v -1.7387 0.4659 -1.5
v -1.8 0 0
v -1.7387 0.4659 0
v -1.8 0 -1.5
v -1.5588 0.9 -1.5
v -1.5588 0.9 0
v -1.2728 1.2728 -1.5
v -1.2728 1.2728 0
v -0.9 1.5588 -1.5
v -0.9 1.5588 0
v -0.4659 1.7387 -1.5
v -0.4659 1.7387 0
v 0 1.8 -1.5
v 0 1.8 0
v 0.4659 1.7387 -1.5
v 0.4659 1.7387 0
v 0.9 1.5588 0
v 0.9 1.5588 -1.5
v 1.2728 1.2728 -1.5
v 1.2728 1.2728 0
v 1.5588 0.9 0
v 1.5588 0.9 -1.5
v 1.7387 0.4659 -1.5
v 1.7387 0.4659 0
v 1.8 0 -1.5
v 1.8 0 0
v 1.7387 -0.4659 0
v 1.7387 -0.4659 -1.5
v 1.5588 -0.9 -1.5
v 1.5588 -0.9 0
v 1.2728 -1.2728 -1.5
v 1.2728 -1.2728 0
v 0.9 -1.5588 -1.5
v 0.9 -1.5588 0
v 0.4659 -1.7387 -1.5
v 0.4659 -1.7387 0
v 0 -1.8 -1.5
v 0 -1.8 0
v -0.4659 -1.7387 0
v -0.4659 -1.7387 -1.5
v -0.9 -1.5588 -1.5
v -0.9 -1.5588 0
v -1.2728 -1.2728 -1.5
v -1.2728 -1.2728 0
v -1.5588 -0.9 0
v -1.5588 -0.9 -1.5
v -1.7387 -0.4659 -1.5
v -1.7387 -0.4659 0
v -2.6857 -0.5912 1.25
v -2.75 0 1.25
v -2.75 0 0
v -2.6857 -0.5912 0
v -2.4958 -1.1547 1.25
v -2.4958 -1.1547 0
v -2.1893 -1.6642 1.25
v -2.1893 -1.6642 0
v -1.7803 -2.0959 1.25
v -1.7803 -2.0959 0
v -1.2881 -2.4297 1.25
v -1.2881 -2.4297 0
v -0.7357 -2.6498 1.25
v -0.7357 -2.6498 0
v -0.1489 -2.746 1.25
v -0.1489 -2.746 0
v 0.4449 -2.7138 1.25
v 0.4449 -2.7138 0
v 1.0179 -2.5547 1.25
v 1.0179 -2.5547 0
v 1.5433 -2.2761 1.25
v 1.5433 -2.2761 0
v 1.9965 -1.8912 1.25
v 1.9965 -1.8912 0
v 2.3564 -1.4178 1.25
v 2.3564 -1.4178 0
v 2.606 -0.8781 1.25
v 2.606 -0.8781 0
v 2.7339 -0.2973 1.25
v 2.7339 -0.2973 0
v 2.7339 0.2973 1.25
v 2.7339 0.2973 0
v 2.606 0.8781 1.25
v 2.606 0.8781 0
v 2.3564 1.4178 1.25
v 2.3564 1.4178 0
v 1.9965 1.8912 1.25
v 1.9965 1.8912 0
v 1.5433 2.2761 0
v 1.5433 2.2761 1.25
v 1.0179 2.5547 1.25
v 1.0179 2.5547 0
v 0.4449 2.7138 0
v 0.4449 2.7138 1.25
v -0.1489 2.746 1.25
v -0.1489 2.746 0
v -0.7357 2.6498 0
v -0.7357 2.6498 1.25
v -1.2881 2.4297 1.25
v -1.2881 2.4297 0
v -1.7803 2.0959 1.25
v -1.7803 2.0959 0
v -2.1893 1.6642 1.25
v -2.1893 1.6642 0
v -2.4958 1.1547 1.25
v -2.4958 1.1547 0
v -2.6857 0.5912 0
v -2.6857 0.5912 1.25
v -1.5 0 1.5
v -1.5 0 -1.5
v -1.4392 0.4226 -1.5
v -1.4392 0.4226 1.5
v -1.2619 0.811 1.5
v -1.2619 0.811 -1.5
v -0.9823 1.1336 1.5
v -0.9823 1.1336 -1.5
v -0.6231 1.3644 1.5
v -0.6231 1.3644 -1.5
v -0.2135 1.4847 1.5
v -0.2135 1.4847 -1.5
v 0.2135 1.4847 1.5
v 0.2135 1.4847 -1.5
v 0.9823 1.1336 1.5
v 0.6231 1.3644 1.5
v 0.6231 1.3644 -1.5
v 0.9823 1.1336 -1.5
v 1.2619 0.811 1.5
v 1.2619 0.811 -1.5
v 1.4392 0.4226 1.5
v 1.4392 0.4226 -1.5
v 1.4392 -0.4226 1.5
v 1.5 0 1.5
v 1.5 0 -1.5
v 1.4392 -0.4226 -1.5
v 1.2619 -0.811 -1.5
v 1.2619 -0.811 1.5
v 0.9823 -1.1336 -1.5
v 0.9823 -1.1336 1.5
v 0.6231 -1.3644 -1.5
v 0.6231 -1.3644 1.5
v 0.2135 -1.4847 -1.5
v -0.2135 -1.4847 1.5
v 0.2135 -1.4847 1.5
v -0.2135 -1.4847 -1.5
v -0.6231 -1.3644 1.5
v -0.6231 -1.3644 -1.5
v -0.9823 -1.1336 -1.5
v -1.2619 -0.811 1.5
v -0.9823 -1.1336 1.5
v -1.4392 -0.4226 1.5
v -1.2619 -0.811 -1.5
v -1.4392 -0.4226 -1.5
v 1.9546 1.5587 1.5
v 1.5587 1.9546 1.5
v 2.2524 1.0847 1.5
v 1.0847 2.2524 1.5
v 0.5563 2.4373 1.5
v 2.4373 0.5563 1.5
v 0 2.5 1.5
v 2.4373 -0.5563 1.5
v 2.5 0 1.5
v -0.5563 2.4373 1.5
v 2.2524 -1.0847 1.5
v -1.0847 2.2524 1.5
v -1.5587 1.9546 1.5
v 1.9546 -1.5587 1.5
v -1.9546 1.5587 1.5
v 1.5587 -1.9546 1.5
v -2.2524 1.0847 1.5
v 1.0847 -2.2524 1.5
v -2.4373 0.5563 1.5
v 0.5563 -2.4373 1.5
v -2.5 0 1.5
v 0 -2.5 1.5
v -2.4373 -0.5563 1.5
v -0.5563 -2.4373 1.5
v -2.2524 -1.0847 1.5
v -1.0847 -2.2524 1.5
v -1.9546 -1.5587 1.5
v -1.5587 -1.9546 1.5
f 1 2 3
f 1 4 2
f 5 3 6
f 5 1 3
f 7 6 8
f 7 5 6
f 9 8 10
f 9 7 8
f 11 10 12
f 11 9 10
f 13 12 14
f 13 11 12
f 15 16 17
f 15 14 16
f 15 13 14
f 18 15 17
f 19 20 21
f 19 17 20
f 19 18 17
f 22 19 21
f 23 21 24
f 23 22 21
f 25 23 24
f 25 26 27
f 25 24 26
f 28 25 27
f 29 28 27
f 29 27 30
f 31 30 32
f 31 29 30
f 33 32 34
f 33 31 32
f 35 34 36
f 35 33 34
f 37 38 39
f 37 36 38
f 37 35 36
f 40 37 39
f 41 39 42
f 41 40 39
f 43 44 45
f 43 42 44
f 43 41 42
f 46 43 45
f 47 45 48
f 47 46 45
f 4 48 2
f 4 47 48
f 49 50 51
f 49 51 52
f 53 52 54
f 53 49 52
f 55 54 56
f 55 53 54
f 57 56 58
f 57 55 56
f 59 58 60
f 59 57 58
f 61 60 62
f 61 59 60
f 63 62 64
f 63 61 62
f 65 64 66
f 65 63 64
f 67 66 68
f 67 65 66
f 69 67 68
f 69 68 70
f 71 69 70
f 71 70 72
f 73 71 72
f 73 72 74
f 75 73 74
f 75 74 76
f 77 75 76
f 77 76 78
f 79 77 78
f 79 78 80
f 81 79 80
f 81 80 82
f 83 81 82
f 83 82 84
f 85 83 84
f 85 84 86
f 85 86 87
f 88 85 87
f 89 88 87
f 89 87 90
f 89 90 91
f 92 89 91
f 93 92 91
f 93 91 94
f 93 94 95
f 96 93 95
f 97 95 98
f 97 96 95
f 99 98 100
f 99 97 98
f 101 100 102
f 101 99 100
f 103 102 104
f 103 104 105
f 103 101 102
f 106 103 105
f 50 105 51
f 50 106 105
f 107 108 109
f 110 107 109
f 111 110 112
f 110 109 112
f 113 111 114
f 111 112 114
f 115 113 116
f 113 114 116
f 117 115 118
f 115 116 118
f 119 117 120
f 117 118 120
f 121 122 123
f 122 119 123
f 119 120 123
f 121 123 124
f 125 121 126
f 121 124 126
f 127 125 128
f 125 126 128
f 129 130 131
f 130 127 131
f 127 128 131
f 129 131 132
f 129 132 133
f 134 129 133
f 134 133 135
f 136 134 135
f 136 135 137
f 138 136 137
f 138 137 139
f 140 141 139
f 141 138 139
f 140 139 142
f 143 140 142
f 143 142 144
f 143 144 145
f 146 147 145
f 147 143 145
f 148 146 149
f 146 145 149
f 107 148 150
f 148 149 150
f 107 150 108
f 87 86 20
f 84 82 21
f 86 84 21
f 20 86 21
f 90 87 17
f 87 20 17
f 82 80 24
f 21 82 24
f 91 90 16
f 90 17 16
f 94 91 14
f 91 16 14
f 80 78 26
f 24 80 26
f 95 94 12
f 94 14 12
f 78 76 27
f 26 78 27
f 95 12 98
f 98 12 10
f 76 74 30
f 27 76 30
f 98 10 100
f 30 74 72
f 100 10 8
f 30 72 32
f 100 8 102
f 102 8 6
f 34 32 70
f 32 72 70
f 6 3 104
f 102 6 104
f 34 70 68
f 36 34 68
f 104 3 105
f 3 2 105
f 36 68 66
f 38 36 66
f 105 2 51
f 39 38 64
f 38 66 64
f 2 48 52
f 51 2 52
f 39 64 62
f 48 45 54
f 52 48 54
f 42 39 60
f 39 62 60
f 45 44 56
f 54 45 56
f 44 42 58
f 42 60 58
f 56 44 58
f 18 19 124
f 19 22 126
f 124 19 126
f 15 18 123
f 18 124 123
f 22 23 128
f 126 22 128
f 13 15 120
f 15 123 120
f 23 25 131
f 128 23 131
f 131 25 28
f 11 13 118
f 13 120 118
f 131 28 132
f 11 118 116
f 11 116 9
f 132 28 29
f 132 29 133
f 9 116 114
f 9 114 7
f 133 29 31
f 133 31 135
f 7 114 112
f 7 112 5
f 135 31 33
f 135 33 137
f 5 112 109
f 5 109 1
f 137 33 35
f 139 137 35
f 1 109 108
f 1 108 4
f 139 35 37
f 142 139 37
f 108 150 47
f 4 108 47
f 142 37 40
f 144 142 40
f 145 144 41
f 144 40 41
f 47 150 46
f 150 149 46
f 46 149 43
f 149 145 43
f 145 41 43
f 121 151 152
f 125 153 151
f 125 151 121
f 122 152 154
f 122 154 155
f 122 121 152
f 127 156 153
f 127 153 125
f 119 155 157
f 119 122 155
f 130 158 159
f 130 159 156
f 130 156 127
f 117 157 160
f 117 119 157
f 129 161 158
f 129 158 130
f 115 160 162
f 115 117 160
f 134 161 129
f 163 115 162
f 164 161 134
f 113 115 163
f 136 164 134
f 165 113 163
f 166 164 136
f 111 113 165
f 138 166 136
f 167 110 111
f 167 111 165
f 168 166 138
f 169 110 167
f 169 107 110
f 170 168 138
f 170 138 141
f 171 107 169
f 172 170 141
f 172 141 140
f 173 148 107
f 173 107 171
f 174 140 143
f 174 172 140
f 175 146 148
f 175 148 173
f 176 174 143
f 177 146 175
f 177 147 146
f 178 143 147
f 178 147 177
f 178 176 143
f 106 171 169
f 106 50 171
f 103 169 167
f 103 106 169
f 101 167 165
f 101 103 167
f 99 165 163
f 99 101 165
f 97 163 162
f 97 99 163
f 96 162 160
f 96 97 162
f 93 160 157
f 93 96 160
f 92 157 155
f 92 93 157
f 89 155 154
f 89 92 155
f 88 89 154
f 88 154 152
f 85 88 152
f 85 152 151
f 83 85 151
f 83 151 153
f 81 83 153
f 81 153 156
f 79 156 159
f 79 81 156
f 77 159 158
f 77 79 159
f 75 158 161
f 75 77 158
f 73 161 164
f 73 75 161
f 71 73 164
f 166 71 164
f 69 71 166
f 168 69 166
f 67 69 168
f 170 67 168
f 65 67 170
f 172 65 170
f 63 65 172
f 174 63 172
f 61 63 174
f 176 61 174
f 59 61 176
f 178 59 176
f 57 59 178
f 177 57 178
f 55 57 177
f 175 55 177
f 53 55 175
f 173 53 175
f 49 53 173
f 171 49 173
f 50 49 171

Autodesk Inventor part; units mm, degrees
ref_plane "YZ Plane" through (0, 0, 0) normal (1, 0, 0) x (0, 1, 0)
ref_plane "XZ Plane" through (0, 0, 0) normal (0, 1, 0) x (-1, 0, 0)
ref_plane "XY Plane" through (0, 0, 0) normal (0, 0, 1) x (1, 0, 0)
sketch "Эскиз1" plane through (0, 0, 0) normal (0, 1, 0) x (-1, 0, 0)
  line L0 (0, 0) -> (2.75, 0)
  line L1 (2.75, 0) -> (2.75, 1.5)
  line L2 (2.75, 1.5) -> (-2.75, 1.5)
  line L3 (-2.75, 1.5) -> (-2.75, 0)
  line L4 (-2.75, 0) -> (2.75, 0)
  line L5 (0, 0) -> (1.8, 0)
  line L6 (1.8, 0) -> (1.8, -1.5)
  line L7 (1.8, -1.5) -> (-1.8, -1.5)
  line L8 (-1.8, -1.5) -> (-1.8, 0)
  line L9 (0, 1.5) -> (1.5, 1.5)
  line L10 (1.5, 1.5) -> (1.5, -1.5)
  line L11 (0, -1.5) -> (0, 1.5)
  dimension "d0" = 2.75
  dimension "d1" = 1.5
  dimension "d2" = 5.5
  dimension "d3" = 1.8
  dimension "d4" = 1.5
  dimension "d5" = 3.6
  dimension "d6" = 1.5
revolve "Вращение1" add sketch "Эскиз1" angle 360 about axis through (0, 0, -1.5) along (0, 0, 1) contours L0 L10 L2 L1 | L6 L7 L10 L0
thread "Резьба1" size "M3x0.5" class "6H" standard "ANSI Metric M Profile" full length
chamfer "Фаска1" distance 0.25 angle 45 1 edges at (2.75, 0, 1.5)
properties part number "soldered nut_1,5"
